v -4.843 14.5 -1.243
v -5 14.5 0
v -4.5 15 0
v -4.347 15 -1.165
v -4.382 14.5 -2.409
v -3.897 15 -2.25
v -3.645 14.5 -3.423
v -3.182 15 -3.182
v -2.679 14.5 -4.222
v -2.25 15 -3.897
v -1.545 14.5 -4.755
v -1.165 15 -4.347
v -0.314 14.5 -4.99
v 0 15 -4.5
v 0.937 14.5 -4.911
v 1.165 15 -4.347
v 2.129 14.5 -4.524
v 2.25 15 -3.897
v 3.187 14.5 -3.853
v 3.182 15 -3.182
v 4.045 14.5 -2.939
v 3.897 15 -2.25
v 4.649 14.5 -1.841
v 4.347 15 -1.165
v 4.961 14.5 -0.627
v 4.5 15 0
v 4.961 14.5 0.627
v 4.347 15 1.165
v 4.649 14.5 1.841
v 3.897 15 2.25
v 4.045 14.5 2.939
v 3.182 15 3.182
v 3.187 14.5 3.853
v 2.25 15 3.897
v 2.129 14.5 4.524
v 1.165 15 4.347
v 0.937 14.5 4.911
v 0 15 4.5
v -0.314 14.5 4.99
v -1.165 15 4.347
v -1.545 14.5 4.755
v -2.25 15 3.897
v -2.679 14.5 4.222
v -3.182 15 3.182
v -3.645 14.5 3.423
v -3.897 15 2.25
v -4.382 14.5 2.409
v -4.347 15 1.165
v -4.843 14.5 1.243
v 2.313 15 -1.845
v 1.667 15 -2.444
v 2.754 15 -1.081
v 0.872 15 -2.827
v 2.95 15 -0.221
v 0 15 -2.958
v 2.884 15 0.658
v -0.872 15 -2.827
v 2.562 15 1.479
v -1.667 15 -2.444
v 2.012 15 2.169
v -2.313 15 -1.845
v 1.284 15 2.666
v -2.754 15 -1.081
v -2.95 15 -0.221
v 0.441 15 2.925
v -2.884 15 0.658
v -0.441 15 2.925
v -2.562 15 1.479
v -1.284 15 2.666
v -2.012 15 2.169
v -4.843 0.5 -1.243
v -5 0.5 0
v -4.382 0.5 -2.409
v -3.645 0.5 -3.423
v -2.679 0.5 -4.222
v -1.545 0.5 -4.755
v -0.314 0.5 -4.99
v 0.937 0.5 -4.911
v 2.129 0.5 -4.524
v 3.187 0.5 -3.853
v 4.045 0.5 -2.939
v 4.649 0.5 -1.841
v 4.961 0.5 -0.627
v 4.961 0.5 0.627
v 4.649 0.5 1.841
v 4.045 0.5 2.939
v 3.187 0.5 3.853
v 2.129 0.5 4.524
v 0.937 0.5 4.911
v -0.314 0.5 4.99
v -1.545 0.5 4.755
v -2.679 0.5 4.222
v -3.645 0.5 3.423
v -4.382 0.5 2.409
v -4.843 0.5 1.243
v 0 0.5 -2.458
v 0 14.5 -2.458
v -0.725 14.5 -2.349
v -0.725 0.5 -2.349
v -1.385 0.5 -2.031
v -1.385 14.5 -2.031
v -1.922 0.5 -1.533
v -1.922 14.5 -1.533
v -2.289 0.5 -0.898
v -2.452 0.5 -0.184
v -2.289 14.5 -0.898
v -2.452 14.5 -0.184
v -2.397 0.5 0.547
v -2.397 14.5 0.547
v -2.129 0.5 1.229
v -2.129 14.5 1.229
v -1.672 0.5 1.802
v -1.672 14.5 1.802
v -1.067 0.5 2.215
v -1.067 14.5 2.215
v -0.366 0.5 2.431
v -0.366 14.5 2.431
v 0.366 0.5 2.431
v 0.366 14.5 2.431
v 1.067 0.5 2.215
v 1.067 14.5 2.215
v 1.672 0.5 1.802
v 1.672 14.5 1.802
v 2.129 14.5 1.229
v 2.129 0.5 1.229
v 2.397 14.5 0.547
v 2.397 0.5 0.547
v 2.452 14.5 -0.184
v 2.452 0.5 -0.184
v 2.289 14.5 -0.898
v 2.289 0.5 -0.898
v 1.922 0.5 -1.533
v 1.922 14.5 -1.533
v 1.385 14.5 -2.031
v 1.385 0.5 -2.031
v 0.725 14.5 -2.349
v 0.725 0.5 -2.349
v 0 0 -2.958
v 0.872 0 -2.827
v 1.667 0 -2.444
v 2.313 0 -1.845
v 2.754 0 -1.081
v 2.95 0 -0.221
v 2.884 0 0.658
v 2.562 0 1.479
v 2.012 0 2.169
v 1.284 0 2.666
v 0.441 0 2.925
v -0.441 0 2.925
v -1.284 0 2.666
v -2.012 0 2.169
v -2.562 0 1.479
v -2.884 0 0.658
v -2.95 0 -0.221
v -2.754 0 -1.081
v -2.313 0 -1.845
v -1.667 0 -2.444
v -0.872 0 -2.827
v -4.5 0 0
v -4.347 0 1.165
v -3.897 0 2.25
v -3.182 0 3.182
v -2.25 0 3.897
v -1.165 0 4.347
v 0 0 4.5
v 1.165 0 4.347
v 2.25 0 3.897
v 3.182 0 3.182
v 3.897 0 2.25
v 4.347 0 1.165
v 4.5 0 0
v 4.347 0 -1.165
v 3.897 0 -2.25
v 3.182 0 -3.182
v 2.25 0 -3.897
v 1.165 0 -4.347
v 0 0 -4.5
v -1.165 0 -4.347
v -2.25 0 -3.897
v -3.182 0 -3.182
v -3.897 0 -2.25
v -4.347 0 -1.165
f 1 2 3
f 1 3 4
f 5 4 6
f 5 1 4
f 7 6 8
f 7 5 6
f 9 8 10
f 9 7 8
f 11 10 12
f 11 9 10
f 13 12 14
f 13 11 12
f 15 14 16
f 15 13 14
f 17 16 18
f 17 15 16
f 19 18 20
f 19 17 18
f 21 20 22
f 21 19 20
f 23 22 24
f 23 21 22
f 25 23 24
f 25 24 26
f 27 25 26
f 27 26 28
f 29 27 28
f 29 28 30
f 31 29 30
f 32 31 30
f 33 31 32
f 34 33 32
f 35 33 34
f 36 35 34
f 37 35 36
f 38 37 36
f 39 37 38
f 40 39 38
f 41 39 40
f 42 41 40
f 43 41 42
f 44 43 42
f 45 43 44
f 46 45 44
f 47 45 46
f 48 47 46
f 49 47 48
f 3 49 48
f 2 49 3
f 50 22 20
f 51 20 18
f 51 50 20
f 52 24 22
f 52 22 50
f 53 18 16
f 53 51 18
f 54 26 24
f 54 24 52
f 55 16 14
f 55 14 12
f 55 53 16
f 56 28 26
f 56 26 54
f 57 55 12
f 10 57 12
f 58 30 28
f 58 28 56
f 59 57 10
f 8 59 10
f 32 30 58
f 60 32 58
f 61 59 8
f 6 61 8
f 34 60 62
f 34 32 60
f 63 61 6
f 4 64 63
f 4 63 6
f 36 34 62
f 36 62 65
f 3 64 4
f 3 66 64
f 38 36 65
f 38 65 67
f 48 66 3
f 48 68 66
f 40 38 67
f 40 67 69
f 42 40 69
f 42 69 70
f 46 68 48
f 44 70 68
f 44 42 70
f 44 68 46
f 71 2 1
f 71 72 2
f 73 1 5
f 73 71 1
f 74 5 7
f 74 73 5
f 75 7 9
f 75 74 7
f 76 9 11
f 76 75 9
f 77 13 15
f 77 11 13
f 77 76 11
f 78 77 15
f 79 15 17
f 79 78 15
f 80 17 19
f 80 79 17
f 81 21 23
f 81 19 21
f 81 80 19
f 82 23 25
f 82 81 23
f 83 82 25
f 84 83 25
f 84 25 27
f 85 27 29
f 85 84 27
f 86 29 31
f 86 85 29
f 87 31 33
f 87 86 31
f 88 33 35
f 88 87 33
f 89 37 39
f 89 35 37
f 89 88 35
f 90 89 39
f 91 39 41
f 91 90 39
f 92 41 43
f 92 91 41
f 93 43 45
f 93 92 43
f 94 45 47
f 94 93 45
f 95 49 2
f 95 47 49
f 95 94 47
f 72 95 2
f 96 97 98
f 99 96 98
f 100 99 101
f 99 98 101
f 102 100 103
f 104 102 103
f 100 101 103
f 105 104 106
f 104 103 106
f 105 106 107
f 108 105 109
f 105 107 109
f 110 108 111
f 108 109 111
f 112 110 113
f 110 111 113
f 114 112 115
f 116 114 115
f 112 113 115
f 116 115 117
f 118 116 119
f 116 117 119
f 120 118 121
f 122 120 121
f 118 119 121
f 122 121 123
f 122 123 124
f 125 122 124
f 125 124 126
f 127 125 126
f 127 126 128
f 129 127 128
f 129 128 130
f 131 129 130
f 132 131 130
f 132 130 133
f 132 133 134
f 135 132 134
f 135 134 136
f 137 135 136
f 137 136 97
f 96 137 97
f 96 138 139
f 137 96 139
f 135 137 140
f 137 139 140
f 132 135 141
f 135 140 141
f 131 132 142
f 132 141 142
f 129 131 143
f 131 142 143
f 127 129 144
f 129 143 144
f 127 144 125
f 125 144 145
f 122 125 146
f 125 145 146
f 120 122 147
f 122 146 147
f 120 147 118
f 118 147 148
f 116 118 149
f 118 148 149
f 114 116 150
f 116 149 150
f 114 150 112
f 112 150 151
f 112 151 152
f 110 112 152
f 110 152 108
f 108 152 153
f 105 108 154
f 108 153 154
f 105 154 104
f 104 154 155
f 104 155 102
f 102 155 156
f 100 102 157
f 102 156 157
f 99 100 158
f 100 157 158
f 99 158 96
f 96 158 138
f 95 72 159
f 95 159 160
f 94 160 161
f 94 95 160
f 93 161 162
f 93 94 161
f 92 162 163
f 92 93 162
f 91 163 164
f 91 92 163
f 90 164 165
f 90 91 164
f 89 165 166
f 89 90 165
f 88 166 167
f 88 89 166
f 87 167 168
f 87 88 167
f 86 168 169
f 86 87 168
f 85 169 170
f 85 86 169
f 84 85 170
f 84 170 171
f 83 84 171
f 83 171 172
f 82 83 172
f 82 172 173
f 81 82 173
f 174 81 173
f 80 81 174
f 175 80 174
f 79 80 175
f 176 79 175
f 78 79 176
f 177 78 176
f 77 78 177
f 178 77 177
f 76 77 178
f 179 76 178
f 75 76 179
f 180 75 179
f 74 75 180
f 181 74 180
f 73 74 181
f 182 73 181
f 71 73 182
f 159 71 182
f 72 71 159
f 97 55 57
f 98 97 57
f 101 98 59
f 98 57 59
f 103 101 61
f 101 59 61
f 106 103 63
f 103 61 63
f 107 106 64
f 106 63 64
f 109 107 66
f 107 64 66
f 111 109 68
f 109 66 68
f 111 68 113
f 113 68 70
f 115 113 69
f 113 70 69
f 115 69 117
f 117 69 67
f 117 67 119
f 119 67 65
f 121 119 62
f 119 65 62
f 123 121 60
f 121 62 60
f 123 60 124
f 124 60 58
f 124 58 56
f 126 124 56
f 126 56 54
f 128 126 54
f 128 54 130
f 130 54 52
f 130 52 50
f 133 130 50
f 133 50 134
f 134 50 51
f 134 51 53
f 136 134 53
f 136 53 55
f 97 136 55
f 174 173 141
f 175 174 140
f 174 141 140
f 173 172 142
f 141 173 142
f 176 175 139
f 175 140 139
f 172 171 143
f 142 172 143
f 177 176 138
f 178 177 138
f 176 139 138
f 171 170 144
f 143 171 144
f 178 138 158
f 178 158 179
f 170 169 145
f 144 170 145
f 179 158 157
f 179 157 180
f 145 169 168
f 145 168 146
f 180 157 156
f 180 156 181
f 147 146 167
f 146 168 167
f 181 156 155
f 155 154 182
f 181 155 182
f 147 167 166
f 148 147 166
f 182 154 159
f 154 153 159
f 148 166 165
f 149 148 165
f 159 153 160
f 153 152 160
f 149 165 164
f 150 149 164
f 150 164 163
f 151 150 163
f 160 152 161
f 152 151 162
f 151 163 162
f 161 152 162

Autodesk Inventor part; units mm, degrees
ref_plane "YZ Plane" through (0, 0, 0) normal (1, 0, 0) x (0, 1, 0)
ref_plane "XZ Plane" through (0, 0, 0) normal (0, 1, 0) x (-1, 0, 0)
ref_plane "XY Plane" through (0, 0, 0) normal (0, 0, 1) x (1, 0, 0)
sketch "Sketch1" plane through (0, 0, 0) normal (0, 1, 0) x (-1, 0, 0)
  circle A0 centre (0, 0) radius 5
  dimension "d0" = 10
extrude "Extrusion1" add sketch "Sketch1" along normal blind 15
hole "Hole1" at (0, 0, 0) direction (0, 1, 0) diameter 4.917 end through all thread size "M6x1" class "6H" standard "ISO Metric profile"
chamfer "Chamfer1" distance 0.5 angle 45 4 edges at (5, 0, 0) (0, 0, 2.4585) (5, 15, 0) (0, 15, 2.4585)
properties part number "gevindmuffe" material "Steel"
